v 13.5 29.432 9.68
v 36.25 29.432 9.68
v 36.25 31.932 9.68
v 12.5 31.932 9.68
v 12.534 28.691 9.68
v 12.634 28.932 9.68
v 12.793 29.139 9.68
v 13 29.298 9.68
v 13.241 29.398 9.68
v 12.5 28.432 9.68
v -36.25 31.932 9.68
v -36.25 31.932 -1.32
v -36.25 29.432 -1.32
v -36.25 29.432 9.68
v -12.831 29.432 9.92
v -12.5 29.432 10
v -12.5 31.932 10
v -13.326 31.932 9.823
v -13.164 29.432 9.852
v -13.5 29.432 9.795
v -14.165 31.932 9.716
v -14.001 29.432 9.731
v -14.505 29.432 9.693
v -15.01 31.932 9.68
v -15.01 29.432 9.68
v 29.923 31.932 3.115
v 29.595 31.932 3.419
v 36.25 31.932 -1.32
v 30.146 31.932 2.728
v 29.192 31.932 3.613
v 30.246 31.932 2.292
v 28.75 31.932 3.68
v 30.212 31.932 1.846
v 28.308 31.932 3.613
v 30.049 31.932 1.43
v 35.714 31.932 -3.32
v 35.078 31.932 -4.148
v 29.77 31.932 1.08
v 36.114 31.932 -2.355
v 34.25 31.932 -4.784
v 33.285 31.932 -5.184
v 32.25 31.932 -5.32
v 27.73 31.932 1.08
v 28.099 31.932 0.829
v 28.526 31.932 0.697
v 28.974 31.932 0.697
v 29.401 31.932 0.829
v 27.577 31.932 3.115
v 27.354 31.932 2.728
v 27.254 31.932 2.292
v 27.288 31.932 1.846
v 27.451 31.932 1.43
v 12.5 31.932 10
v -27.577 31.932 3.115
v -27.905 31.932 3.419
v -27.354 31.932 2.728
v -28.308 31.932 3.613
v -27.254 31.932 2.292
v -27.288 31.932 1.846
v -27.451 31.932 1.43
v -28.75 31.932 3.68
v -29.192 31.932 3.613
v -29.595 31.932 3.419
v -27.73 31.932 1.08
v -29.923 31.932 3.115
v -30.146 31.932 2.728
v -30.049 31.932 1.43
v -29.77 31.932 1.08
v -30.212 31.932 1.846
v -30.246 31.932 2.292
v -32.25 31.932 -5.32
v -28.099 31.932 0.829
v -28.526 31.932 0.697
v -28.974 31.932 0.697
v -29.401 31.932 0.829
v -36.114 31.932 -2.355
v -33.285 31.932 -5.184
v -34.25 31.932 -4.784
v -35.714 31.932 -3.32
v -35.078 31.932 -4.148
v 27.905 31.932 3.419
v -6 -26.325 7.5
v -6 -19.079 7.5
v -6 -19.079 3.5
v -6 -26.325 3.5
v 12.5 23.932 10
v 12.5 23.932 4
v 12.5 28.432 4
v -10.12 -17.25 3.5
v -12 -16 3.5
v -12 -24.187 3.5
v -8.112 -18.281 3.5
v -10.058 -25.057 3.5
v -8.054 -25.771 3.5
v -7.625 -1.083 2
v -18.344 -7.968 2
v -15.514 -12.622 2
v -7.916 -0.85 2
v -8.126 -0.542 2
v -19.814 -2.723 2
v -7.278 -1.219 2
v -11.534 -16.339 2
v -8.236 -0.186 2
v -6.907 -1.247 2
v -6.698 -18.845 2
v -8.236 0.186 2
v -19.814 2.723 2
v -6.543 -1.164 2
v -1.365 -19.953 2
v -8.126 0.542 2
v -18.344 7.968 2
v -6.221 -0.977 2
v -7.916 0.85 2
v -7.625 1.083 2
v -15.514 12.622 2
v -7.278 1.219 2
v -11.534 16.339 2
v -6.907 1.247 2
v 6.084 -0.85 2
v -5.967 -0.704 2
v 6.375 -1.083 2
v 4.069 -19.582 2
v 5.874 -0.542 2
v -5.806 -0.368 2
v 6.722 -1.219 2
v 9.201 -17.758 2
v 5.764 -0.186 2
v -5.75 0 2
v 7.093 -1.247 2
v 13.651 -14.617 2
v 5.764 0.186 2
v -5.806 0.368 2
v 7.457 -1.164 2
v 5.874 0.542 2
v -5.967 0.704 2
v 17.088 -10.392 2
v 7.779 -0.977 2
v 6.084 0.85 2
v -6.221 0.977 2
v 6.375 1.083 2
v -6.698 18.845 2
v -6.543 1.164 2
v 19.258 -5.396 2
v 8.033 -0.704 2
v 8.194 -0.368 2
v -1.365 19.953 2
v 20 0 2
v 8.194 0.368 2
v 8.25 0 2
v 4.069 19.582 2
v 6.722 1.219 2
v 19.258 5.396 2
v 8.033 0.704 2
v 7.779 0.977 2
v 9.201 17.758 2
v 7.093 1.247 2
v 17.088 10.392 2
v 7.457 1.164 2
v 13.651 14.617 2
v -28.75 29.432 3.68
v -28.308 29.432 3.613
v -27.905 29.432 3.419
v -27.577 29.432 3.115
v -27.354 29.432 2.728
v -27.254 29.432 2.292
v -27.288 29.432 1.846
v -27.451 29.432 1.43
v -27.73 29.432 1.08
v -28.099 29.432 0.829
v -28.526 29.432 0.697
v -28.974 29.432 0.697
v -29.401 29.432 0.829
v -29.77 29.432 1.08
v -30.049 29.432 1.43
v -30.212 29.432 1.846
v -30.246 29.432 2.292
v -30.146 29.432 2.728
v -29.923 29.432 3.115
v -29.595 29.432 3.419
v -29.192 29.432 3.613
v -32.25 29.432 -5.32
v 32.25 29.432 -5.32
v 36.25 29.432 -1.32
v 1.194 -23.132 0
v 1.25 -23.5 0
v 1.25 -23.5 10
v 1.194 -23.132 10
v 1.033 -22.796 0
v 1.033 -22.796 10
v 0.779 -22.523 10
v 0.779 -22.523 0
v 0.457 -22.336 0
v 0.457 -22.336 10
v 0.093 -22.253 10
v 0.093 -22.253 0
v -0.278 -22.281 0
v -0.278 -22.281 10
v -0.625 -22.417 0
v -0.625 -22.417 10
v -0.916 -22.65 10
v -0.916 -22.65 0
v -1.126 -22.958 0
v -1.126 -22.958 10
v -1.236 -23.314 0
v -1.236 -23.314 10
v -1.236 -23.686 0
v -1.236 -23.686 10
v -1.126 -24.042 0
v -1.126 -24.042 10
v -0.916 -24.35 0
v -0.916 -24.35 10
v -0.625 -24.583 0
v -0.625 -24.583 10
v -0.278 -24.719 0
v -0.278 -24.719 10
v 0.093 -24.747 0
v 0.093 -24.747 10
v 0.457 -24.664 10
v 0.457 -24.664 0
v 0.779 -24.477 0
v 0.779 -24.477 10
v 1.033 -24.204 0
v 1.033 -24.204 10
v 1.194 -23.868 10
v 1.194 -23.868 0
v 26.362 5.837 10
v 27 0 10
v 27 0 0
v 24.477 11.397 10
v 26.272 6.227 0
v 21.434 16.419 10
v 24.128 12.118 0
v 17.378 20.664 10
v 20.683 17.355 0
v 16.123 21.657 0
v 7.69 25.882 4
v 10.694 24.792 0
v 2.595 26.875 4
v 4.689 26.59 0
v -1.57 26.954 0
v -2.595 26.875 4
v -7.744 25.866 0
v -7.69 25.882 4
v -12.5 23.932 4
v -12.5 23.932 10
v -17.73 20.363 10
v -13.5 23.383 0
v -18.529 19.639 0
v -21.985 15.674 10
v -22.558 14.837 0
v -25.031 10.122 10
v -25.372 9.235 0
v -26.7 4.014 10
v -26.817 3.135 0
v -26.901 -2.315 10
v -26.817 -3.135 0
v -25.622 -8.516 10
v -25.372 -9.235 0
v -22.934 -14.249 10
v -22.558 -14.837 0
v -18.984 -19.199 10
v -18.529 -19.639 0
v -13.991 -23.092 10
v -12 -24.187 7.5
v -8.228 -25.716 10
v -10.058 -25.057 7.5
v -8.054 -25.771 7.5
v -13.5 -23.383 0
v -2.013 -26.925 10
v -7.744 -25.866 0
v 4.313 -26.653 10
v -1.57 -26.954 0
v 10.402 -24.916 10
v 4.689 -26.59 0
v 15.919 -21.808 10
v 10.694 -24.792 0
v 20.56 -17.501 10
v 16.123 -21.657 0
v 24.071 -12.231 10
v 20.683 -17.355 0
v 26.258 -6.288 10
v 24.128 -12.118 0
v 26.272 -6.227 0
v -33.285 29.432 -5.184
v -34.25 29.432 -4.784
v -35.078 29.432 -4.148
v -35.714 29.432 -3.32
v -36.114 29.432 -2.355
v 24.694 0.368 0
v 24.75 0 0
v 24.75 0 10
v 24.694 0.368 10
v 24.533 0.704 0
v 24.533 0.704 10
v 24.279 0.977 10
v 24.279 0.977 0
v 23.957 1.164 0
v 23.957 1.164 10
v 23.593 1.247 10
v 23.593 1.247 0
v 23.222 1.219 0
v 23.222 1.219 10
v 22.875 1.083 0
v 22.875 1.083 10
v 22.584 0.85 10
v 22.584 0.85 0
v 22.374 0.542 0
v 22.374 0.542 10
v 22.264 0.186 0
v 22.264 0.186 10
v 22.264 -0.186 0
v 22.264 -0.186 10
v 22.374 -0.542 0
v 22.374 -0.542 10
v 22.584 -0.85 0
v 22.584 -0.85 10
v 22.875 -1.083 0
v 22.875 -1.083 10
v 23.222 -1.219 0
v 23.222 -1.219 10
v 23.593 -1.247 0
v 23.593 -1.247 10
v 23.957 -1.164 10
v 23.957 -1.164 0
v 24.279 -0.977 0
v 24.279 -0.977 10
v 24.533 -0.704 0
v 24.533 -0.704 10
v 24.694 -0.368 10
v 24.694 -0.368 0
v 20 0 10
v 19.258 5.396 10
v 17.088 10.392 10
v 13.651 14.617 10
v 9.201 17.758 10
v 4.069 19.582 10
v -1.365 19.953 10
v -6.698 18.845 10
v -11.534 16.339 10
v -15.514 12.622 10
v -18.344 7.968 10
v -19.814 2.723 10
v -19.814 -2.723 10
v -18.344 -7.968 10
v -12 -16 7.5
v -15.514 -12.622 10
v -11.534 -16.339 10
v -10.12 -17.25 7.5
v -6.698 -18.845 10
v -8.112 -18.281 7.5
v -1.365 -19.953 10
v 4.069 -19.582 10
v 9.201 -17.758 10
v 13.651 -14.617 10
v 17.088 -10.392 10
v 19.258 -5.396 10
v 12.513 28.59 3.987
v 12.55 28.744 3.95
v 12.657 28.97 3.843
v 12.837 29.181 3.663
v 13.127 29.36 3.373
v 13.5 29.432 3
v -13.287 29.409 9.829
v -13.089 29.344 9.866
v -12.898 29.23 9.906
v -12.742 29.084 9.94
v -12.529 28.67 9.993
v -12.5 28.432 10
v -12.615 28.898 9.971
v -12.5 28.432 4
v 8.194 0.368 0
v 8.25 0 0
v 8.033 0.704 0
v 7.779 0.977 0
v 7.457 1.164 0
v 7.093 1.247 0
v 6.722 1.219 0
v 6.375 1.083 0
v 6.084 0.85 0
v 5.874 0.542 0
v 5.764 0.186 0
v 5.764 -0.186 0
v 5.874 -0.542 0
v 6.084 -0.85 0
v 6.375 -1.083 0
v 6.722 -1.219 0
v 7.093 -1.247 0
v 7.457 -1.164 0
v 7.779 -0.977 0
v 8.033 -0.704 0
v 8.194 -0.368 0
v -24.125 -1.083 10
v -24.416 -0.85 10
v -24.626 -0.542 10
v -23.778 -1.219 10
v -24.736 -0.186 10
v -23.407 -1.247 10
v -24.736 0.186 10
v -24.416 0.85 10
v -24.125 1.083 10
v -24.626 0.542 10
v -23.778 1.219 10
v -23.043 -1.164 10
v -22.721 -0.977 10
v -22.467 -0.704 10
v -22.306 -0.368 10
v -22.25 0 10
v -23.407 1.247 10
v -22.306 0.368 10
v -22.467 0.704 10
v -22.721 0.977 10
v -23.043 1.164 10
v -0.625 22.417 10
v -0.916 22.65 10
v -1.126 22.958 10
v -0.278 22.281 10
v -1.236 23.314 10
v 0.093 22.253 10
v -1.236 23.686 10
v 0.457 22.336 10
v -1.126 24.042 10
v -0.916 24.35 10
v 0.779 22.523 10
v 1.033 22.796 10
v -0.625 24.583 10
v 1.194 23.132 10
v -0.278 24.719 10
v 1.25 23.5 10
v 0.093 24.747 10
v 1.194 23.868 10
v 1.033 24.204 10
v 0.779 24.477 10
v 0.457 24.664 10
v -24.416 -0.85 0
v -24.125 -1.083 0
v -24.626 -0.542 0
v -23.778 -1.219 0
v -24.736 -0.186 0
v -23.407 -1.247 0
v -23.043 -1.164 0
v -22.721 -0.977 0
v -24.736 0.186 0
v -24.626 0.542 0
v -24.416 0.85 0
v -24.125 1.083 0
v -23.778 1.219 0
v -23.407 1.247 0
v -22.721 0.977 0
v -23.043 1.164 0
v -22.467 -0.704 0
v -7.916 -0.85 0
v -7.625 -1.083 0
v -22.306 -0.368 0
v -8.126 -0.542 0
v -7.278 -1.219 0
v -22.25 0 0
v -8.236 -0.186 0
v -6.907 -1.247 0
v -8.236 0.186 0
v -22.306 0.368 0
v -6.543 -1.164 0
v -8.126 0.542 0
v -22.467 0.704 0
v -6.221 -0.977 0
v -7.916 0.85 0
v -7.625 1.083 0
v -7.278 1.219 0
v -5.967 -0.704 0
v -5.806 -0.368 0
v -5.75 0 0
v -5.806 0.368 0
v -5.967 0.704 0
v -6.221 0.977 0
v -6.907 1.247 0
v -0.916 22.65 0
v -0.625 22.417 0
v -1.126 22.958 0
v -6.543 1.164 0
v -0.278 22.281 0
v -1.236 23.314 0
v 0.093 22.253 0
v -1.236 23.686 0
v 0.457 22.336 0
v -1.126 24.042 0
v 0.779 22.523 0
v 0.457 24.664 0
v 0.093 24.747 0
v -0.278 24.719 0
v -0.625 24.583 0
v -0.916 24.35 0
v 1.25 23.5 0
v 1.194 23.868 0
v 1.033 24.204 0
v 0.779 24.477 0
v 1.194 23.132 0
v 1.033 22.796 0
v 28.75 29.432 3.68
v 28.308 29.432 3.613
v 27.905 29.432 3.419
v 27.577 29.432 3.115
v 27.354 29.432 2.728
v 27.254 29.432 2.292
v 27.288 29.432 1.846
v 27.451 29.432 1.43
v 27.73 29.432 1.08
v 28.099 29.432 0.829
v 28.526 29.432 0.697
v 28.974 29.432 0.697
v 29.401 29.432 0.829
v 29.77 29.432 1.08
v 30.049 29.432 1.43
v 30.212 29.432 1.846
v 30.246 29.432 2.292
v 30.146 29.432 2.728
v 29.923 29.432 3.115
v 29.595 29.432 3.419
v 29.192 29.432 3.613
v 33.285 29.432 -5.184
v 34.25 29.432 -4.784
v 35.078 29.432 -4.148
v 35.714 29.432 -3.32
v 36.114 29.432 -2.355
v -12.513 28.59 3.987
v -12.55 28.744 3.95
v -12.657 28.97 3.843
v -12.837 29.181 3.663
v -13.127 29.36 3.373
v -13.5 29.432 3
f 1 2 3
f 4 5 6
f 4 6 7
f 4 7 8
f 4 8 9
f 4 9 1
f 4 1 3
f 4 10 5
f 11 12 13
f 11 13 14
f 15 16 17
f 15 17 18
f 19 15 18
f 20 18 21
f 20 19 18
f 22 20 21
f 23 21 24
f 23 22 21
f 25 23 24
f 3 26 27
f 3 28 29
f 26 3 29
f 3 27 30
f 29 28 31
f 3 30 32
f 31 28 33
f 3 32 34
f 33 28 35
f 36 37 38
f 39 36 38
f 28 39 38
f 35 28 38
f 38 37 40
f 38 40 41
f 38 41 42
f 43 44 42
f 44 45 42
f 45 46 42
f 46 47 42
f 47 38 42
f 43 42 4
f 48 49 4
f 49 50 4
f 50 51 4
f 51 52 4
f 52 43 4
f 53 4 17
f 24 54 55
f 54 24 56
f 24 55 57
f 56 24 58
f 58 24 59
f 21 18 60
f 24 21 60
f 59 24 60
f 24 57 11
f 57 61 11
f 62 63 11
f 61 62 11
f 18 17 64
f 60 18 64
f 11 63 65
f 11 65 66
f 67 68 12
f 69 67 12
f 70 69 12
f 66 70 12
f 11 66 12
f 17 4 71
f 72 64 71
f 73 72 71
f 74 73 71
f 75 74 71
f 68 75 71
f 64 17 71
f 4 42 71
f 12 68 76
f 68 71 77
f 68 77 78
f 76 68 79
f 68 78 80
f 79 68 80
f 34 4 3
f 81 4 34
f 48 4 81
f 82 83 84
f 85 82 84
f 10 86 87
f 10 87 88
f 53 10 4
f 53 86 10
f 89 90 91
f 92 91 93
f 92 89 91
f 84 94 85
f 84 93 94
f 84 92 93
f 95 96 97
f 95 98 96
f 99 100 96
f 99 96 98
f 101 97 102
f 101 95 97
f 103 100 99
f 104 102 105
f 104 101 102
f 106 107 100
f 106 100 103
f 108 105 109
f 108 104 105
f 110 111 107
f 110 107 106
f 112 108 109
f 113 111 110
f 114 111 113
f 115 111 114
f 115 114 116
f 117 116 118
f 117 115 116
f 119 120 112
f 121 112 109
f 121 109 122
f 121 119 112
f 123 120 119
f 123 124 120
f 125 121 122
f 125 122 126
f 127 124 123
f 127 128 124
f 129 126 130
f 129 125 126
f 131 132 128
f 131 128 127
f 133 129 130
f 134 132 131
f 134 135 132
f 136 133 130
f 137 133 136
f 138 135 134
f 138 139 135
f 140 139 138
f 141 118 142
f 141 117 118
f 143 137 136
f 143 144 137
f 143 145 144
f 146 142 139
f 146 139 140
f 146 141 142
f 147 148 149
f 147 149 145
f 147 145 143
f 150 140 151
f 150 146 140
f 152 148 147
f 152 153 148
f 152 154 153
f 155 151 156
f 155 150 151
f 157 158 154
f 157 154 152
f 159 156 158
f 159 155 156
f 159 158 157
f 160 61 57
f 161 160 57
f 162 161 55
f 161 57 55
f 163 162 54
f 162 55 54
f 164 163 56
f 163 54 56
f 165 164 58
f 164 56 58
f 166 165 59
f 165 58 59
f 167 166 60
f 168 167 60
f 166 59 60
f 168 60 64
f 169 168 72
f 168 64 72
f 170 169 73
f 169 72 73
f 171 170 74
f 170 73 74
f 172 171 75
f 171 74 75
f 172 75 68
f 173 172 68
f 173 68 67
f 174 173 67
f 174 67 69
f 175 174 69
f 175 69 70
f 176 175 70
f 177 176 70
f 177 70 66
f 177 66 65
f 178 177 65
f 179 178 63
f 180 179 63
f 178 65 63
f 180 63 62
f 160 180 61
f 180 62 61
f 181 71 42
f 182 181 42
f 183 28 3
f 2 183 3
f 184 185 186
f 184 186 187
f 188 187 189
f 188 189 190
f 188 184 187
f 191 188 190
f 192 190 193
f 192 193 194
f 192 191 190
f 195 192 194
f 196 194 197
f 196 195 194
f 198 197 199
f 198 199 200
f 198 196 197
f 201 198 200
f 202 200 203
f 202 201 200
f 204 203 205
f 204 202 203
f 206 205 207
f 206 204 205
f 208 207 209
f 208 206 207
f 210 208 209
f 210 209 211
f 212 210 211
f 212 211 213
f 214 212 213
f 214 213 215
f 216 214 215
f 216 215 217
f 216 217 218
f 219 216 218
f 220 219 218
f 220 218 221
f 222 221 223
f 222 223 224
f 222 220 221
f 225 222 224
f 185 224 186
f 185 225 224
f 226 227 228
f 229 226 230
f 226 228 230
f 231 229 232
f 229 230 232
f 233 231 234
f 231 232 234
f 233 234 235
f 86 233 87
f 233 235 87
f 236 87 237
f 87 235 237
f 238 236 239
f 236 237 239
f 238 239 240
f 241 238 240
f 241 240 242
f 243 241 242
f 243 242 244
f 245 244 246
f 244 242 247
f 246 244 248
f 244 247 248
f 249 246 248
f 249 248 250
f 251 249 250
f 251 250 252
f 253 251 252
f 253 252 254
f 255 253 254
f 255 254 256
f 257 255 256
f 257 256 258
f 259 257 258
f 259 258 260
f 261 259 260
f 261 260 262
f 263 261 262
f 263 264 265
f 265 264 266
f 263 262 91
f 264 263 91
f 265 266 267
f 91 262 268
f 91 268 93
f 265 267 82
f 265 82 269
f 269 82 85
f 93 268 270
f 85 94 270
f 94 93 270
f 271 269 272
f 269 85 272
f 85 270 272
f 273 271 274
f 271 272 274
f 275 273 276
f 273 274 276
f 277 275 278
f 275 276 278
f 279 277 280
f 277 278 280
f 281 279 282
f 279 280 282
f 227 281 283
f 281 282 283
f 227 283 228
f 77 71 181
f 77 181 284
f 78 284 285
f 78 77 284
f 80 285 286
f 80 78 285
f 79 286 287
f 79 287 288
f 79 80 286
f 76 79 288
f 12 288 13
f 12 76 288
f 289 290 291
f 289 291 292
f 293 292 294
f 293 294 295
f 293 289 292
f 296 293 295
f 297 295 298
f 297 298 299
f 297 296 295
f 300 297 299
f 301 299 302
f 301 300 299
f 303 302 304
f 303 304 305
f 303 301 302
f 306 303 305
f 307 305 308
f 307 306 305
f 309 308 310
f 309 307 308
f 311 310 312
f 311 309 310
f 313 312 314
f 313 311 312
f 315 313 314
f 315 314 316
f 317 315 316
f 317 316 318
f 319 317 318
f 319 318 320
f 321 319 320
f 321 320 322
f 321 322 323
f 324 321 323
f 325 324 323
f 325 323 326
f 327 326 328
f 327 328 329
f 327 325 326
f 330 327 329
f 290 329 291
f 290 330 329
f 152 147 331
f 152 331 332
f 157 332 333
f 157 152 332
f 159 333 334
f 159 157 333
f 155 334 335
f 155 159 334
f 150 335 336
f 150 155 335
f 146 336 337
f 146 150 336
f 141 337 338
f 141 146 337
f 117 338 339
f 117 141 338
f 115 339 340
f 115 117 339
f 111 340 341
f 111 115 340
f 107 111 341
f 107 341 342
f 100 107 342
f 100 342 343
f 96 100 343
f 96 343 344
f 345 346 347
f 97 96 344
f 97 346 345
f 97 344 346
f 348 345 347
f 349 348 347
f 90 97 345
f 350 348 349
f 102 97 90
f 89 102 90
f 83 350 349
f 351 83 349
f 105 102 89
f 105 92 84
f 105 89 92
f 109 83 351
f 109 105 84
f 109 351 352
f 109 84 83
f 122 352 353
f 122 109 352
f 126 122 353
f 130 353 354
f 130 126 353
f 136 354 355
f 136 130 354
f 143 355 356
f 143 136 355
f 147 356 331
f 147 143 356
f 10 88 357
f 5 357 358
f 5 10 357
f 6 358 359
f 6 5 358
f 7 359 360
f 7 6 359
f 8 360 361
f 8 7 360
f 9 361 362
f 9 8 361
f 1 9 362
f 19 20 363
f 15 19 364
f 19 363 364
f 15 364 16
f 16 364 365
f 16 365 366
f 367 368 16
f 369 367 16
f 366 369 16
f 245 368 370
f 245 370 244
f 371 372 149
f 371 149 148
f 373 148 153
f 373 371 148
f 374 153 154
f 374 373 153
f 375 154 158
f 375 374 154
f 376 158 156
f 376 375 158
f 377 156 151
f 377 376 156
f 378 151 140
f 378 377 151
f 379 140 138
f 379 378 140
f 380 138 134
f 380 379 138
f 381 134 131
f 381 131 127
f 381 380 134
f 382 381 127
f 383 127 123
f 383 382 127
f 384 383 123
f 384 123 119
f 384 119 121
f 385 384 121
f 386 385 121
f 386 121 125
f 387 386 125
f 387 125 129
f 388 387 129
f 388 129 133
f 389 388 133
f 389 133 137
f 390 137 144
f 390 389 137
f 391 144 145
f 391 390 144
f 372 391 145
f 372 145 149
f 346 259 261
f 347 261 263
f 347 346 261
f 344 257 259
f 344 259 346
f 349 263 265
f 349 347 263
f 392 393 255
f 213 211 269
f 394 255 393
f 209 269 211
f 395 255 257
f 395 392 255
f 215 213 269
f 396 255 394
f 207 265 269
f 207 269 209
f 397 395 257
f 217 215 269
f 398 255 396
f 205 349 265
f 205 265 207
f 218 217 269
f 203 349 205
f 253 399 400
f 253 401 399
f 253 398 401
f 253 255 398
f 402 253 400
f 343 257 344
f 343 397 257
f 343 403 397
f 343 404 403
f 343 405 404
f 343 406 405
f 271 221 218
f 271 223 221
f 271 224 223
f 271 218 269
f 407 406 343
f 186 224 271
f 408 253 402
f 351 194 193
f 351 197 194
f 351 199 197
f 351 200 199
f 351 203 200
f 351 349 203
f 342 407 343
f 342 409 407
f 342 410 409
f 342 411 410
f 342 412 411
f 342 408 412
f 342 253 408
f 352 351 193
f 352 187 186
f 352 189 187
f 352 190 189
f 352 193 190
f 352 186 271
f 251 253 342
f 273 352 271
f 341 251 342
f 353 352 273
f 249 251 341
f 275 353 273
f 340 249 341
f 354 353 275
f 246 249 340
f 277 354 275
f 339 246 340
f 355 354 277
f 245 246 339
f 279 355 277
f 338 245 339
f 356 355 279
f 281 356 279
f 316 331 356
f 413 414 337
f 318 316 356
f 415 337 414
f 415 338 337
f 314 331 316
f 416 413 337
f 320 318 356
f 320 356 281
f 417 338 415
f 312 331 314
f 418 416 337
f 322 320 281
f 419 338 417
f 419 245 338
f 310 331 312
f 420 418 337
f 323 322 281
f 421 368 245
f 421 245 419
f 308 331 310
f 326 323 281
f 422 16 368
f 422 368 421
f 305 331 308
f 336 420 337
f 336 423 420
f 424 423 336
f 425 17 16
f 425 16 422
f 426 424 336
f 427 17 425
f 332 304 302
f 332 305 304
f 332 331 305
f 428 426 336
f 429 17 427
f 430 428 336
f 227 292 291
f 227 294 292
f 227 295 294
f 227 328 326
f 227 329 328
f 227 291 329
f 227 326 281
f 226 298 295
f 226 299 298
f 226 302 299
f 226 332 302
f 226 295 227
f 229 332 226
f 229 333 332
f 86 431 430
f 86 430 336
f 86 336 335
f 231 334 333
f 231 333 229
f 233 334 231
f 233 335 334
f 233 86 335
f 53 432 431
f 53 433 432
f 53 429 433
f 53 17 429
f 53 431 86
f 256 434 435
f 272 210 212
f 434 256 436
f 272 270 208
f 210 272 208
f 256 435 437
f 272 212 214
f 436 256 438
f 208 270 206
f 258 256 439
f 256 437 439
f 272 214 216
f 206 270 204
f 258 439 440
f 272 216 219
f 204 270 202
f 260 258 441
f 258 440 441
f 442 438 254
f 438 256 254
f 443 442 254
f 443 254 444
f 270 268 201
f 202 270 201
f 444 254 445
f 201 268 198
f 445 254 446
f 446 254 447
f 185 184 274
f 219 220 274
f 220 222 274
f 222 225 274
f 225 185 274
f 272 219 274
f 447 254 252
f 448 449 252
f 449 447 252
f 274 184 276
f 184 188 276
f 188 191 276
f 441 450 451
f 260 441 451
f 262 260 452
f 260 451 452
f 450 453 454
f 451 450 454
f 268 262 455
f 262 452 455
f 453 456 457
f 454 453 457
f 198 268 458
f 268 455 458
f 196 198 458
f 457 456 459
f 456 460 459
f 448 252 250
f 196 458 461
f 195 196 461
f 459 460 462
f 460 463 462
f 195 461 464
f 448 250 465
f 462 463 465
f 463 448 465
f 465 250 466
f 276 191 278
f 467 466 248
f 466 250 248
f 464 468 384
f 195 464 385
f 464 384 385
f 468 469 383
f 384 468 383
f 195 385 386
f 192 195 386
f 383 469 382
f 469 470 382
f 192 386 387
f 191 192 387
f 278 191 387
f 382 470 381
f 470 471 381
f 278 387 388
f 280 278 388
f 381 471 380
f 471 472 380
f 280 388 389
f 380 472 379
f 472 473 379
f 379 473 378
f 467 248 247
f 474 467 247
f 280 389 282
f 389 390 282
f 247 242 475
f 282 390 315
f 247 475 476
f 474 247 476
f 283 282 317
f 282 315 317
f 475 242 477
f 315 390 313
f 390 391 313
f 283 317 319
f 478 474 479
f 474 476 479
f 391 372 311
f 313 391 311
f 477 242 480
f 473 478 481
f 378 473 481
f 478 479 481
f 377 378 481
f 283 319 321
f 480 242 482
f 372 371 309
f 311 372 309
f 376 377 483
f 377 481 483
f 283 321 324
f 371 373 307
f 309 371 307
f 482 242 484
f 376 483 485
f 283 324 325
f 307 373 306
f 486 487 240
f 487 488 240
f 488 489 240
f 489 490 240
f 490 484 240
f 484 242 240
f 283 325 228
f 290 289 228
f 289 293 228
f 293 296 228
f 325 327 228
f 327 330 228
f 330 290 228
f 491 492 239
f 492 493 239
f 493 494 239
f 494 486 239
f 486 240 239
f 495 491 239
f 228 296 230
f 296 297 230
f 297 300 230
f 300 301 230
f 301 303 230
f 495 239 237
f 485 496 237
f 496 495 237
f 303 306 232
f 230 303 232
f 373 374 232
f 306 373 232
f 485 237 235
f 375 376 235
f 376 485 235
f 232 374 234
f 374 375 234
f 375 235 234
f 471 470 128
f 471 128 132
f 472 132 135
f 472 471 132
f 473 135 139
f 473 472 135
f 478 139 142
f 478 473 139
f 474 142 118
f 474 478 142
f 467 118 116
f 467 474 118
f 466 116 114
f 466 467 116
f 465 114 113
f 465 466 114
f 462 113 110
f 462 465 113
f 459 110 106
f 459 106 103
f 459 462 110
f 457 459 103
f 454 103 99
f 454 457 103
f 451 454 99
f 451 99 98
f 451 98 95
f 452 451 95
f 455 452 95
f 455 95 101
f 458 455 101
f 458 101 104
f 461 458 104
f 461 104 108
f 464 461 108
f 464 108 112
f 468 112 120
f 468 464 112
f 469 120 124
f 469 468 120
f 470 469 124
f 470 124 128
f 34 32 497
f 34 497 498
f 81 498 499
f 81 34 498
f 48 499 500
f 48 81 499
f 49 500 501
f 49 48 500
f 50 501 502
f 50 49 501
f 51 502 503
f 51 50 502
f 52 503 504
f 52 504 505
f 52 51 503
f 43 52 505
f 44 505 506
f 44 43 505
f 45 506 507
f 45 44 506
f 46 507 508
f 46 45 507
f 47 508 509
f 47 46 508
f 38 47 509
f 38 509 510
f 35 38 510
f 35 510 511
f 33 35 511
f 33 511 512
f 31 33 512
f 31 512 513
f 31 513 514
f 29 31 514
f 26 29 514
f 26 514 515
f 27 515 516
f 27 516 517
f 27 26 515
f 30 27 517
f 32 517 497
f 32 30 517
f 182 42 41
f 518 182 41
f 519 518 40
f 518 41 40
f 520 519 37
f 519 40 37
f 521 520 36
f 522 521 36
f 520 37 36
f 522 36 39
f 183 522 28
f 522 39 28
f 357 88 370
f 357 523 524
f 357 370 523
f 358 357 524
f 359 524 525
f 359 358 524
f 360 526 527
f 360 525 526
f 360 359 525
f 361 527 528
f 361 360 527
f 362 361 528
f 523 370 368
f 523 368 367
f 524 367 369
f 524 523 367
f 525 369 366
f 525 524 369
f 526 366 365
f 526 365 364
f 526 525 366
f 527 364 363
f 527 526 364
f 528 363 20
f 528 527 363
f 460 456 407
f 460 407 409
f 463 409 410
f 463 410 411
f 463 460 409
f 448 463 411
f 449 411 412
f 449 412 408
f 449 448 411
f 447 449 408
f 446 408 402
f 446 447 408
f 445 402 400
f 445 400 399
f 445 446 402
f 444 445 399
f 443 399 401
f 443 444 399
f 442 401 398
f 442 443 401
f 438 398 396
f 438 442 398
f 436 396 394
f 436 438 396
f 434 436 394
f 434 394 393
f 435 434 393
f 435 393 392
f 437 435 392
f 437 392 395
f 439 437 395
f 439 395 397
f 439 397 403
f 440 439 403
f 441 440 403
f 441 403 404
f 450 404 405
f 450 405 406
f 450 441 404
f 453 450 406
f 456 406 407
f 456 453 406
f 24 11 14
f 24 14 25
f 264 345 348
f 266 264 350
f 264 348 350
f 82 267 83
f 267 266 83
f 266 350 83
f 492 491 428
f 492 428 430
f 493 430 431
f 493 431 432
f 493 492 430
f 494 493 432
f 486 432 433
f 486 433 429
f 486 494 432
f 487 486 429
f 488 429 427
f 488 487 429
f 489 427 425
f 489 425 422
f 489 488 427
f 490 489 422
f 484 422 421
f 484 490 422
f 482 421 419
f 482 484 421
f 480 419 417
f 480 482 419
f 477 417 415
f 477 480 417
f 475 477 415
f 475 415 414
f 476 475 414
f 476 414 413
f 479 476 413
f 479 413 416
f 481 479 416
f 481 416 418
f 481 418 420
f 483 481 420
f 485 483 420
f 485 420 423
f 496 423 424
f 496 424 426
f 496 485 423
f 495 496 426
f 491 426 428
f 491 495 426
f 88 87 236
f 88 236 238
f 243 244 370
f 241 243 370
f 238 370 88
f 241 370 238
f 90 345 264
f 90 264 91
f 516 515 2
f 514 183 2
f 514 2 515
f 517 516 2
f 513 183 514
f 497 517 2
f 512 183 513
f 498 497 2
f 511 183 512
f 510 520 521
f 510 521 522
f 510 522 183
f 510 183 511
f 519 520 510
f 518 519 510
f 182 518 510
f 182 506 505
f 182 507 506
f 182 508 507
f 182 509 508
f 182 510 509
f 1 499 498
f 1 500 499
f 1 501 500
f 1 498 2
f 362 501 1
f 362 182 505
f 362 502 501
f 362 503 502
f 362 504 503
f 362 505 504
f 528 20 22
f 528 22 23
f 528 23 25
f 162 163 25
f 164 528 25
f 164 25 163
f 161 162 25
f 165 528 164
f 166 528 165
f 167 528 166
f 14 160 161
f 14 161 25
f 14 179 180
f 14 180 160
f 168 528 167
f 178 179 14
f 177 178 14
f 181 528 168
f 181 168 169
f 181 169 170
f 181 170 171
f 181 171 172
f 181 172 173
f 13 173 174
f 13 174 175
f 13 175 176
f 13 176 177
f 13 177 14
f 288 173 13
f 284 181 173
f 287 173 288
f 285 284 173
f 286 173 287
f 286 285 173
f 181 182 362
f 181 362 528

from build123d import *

# Parameters (mm, degrees)
SKETCH1_R               = 27
SKETCH1_R_2             = 1.25
SKETCH1_R_3             = 20
BOSS_EXTRUDE1_DEPTH     = 10
SKETCH3_R               = 20
SKETCH3_R_2             = 1.25
BOSS_EXTRUDE2_DEPTH     = 2
BOSS_EXTRUDE3_DEPTH     = 6
CUT_EXTRUDE1_REACH      = 44.996
CUT_EXTRUDE1_END_RADIUS = 27
SKETCH4_W               = 6
SKETCH4_H               = 4
SKETCH6_W               = 25
SKETCH6_H               = 15.32
BOSS_EXTRUDE4_DEPTH     = 2.5
SKETCH7_R               = 1.5
BOSS_EXTRUDE5_DEPTH     = 2.5
FILLET2_R               = 10
FILLET3_R               = 1


with BuildPart() as part:
    # Sketch1 → Boss-Extrude1 (new body)
    with BuildSketch(Plane.XY):
        Circle(SKETCH1_R)
        with Locations((0, 23.5)):
            Circle(SKETCH1_R_2, mode=Mode.SUBTRACT)
        with Locations((23.5, 0)):
            Circle(SKETCH1_R_2, mode=Mode.SUBTRACT)
        with Locations((0, -23.5)):
            Circle(SKETCH1_R_2, mode=Mode.SUBTRACT)
        with Locations((-23.5, 0)):
            Circle(SKETCH1_R_2, mode=Mode.SUBTRACT)
        Circle(SKETCH1_R_3, mode=Mode.SUBTRACT)
    extrude(amount=BOSS_EXTRUDE1_DEPTH)

    # Sketch3 → Boss-Extrude2 (add)
    with BuildSketch(Plane.XY):
        Circle(SKETCH3_R)
        with Locations((-7, 0)):
            Circle(SKETCH3_R_2, mode=Mode.SUBTRACT)
        with Locations((7, 0)):
            Circle(SKETCH3_R_2, mode=Mode.SUBTRACT)
    extrude(amount=BOSS_EXTRUDE2_DEPTH)

    # Sketch5 → Boss-Extrude3 (add)
    with BuildSketch(Plane.XY.offset(10)):
        Polygon((-12.5, 23.932195888), (-4.251935746, 23.932195888), (0, 26.25446737), (4.267780323, 23.932195888), (12.5, 23.932195888), (12.5, 31.932195888), (-12.5, 31.932195888), align=None)
    extrude(amount=-BOSS_EXTRUDE3_DEPTH)

    # Cut-Extrude1: up to this cylinder (the profile starts inside it)
    cut_extrude1_end = Plane(origin=(0, 0, 5.5), z_dir=(0, 0, -1)) * Cylinder(CUT_EXTRUDE1_END_RADIUS, 144.992, mode=Mode.PRIVATE)
    # Sketch4 → Cut-Extrude1 (cut, up to the surface)
    with BuildSketch(Plane(origin=(0, 0, 0), x_dir=(1, 0, 0), z_dir=(0, 1, 0)), mode=Mode.PRIVATE) as cut_extrude1_sk1:
        with Locations((-9, -5.5)):
            Rectangle(SKETCH4_W, SKETCH4_H)
    cut_extrude1_tool1 = extrude(cut_extrude1_sk1.sketch, amount=-CUT_EXTRUDE1_REACH, mode=Mode.PRIVATE) & cut_extrude1_end
    add(cut_extrude1_tool1.solids().sort_by_distance((-9, 0, 5.5))[0], mode=Mode.SUBTRACT)

    # Sketch6 → Boss-Extrude4 (add)
    with BuildSketch(Plane(origin=(0, 31.932195888, 0), x_dir=(1, 0, 0), z_dir=(0, 1, 0))):
        with Locations((0, -2.34)):
            Rectangle(SKETCH6_W, SKETCH6_H)
    boss_extrude4 = extrude(amount=-BOSS_EXTRUDE4_DEPTH)

    # Sketch7 → Boss-Extrude5 (add)
    with BuildSketch(Plane(origin=(0, 31.932195888, 0), x_dir=(1, 0, 0), z_dir=(0, 1, 0))):
        with BuildLine():
            Line((-36.25, -9.68), (-28.75, -9.68))
            Line((-28.75, -9.68), (0, -9.68))
            Line((0, -9.68), (0, 5.32))
            Line((0, 5.32), (-32.25, 5.32))
            ThreePointArc((-32.25, 5.32), (-35.078427125, 4.148427125), (-36.25, 1.32))
            Line((-36.25, 1.32), (-36.25, -2.18))
            Line((-36.25, -2.18), (-36.25, -9.68))
        make_face()
        with Locations(Location((-28.75, -2.18, 0), (0, 0, 270))):
            Circle(SKETCH7_R, mode=Mode.SUBTRACT)
    boss_extrude5 = extrude(amount=-BOSS_EXTRUDE5_DEPTH)

    # Fillet2
    # the kernel refuses this fillet: 10 mm, written as the material it adds along each edge
    with BuildSketch(Plane(origin=(-12.5, 29.432195888, 9.68), x_dir=(-1, 0, 0), z_dir=(0, 1, 0))) as fillet2_piece_1:
        with BuildLine():
            CenterArc((2.509501943, 10), FILLET2_R, 255.466253099, 14.533746901)
            Line((0, 0.32), (-0.050190039, 0.1264))
            ThreePointArc((-0.050190039, 0.1264), (-0.2, 0.16), (-0.2, 0))
            Line((-0.2, 0), (0, -0.2))
            Line((0, -0.2), (2.509501943, -0.2))
            Line((2.509501943, -0.2), (2.509501943, 0))
        make_face()
    extrude(amount=2.5)

    # Mirror1: Boss-Extrude4, Boss-Extrude5 across plane
    add(boss_extrude4.mirror(Plane(origin=(0, 0, 0), x_dir=(0, 0, 1), z_dir=(1, 0, 0))))
    add(boss_extrude5.mirror(Plane(origin=(0, 0, 0), x_dir=(0, 0, 1), z_dir=(1, 0, 0))))

    # Fillet3
    # the kernel refuses this fillet: 1 mm, written as the material it adds along each edge
    with BuildSketch(Plane(origin=(-12.5, 29.432195888, 4), x_dir=(0, -1, 0), z_dir=(0, 0, 1))) as fillet3_piece_1_section:
        with BuildLine():
            CenterArc((FILLET3_R, -FILLET3_R), FILLET3_R, 90, 90)
            Line((0, -FILLET3_R), (0, 0))
            Line((0, 0), (FILLET3_R, 0))
        make_face()
    fillet3_piece_1 = extrude(amount=6, mode=Mode.PRIVATE)
    fillet3_piece_1 = fillet3_piece_1 - Plane(origin=(-15.009501943, 29.204760134, 19.68), x_dir=(-1, 0, 0), z_dir=(0, -1, 0)) * Cylinder(10, 16, mode=Mode.PRIVATE)
    add(fillet3_piece_1)
    with BuildSketch(Plane(origin=(12.5, 29.432195888, 9.68), x_dir=(0, -1, 0), z_dir=(0, 0, -1))) as fillet3_piece_2:
        with BuildLine():
            CenterArc((FILLET3_R, -FILLET3_R), FILLET3_R, 90, 90)
            Line((0, -FILLET3_R), (0, 0))
            Line((0, 0), (FILLET3_R, 0))
        make_face()
    extrude(amount=5.68)
    with BuildSketch(Plane(origin=(12.5, 29.432195888, 4), x_dir=(0, -1, 0), z_dir=(-1, 0, 0))) as fillet3_piece_3:
        with BuildLine():
            CenterArc((FILLET3_R, -FILLET3_R), FILLET3_R, 90, 90)
            Line((0, -FILLET3_R), (0, 0))
            Line((0, 0), (FILLET3_R, 0))
        make_face()
    extrude(amount=25)
    with BuildSketch(Plane(origin=(-12.5, 29.432195888, 1.5), x_dir=(0, -1, 0), z_dir=(0, 0, 1))) as fillet3_piece_4a_section:
        with BuildLine():
            CenterArc((FILLET3_R, -FILLET3_R), FILLET3_R, 90, 90)
            Line((0, -FILLET3_R), (0, 0))
            Line((0, 0), (FILLET3_R, 0))
        make_face()
    fillet3_piece_4a = extrude(amount=8.5, mode=Mode.PRIVATE)
    fillet3_piece_4a = split(fillet3_piece_4a, bisect_by=Plane(origin=(-12.726395114, 29.205800773, 4), z_dir=(0, 0, -1)), keep=Keep.TOP, mode=Mode.PRIVATE)
    with BuildSketch(Plane(origin=(12.5, 29.432195888, 4), x_dir=(0, -1, 0), z_dir=(-1, 0, 0))) as fillet3_piece_4b_section:
        with BuildLine():
            CenterArc((FILLET3_R, -FILLET3_R), FILLET3_R, 90, 90)
            Line((0, -FILLET3_R), (0, 0))
            Line((0, 0), (FILLET3_R, 0))
        make_face()
    fillet3_piece_4b = extrude(amount=27.5, mode=Mode.PRIVATE)
    fillet3_piece_4b = split(fillet3_piece_4b, bisect_by=Plane(origin=(-12.5, 29.205800773, 3.773604886), z_dir=(-1, 0, 0)), keep=Keep.TOP, mode=Mode.PRIVATE)
    fillet3_piece_4 = fillet3_piece_4a & fillet3_piece_4b
    add(fillet3_piece_4)
    with BuildSketch(Plane(origin=(12.5, 29.432195888, 9.68), x_dir=(0, -1, 0), z_dir=(0, 0, -1))) as fillet3_piece_5a_section:
        with BuildLine():
            CenterArc((FILLET3_R, -FILLET3_R), FILLET3_R, 90, 90)
            Line((0, -FILLET3_R), (0, 0))
            Line((0, 0), (FILLET3_R, 0))
        make_face()
    fillet3_piece_5a = extrude(amount=8.18, mode=Mode.PRIVATE)
    fillet3_piece_5a = split(fillet3_piece_5a, bisect_by=Plane(origin=(12.726395114, 29.205800773, 4), z_dir=(0, 0, -1)), keep=Keep.TOP, mode=Mode.PRIVATE)
    with BuildSketch(Plane(origin=(15, 29.432195888, 4), x_dir=(0, -1, 0), z_dir=(-1, 0, 0))) as fillet3_piece_5b_section:
        with BuildLine():
            CenterArc((FILLET3_R, -FILLET3_R), FILLET3_R, 90, 90)
            Line((0, -FILLET3_R), (0, 0))
            Line((0, 0), (FILLET3_R, 0))
        make_face()
    fillet3_piece_5b = extrude(amount=27.5, mode=Mode.PRIVATE)
    fillet3_piece_5b = split(fillet3_piece_5b, bisect_by=Plane(origin=(12.5, 29.205800773, 3.773604886), z_dir=(1, 0, 0)), keep=Keep.TOP, mode=Mode.PRIVATE)
    fillet3_piece_5 = fillet3_piece_5a & fillet3_piece_5b
    add(fillet3_piece_5)


solid = part.part
